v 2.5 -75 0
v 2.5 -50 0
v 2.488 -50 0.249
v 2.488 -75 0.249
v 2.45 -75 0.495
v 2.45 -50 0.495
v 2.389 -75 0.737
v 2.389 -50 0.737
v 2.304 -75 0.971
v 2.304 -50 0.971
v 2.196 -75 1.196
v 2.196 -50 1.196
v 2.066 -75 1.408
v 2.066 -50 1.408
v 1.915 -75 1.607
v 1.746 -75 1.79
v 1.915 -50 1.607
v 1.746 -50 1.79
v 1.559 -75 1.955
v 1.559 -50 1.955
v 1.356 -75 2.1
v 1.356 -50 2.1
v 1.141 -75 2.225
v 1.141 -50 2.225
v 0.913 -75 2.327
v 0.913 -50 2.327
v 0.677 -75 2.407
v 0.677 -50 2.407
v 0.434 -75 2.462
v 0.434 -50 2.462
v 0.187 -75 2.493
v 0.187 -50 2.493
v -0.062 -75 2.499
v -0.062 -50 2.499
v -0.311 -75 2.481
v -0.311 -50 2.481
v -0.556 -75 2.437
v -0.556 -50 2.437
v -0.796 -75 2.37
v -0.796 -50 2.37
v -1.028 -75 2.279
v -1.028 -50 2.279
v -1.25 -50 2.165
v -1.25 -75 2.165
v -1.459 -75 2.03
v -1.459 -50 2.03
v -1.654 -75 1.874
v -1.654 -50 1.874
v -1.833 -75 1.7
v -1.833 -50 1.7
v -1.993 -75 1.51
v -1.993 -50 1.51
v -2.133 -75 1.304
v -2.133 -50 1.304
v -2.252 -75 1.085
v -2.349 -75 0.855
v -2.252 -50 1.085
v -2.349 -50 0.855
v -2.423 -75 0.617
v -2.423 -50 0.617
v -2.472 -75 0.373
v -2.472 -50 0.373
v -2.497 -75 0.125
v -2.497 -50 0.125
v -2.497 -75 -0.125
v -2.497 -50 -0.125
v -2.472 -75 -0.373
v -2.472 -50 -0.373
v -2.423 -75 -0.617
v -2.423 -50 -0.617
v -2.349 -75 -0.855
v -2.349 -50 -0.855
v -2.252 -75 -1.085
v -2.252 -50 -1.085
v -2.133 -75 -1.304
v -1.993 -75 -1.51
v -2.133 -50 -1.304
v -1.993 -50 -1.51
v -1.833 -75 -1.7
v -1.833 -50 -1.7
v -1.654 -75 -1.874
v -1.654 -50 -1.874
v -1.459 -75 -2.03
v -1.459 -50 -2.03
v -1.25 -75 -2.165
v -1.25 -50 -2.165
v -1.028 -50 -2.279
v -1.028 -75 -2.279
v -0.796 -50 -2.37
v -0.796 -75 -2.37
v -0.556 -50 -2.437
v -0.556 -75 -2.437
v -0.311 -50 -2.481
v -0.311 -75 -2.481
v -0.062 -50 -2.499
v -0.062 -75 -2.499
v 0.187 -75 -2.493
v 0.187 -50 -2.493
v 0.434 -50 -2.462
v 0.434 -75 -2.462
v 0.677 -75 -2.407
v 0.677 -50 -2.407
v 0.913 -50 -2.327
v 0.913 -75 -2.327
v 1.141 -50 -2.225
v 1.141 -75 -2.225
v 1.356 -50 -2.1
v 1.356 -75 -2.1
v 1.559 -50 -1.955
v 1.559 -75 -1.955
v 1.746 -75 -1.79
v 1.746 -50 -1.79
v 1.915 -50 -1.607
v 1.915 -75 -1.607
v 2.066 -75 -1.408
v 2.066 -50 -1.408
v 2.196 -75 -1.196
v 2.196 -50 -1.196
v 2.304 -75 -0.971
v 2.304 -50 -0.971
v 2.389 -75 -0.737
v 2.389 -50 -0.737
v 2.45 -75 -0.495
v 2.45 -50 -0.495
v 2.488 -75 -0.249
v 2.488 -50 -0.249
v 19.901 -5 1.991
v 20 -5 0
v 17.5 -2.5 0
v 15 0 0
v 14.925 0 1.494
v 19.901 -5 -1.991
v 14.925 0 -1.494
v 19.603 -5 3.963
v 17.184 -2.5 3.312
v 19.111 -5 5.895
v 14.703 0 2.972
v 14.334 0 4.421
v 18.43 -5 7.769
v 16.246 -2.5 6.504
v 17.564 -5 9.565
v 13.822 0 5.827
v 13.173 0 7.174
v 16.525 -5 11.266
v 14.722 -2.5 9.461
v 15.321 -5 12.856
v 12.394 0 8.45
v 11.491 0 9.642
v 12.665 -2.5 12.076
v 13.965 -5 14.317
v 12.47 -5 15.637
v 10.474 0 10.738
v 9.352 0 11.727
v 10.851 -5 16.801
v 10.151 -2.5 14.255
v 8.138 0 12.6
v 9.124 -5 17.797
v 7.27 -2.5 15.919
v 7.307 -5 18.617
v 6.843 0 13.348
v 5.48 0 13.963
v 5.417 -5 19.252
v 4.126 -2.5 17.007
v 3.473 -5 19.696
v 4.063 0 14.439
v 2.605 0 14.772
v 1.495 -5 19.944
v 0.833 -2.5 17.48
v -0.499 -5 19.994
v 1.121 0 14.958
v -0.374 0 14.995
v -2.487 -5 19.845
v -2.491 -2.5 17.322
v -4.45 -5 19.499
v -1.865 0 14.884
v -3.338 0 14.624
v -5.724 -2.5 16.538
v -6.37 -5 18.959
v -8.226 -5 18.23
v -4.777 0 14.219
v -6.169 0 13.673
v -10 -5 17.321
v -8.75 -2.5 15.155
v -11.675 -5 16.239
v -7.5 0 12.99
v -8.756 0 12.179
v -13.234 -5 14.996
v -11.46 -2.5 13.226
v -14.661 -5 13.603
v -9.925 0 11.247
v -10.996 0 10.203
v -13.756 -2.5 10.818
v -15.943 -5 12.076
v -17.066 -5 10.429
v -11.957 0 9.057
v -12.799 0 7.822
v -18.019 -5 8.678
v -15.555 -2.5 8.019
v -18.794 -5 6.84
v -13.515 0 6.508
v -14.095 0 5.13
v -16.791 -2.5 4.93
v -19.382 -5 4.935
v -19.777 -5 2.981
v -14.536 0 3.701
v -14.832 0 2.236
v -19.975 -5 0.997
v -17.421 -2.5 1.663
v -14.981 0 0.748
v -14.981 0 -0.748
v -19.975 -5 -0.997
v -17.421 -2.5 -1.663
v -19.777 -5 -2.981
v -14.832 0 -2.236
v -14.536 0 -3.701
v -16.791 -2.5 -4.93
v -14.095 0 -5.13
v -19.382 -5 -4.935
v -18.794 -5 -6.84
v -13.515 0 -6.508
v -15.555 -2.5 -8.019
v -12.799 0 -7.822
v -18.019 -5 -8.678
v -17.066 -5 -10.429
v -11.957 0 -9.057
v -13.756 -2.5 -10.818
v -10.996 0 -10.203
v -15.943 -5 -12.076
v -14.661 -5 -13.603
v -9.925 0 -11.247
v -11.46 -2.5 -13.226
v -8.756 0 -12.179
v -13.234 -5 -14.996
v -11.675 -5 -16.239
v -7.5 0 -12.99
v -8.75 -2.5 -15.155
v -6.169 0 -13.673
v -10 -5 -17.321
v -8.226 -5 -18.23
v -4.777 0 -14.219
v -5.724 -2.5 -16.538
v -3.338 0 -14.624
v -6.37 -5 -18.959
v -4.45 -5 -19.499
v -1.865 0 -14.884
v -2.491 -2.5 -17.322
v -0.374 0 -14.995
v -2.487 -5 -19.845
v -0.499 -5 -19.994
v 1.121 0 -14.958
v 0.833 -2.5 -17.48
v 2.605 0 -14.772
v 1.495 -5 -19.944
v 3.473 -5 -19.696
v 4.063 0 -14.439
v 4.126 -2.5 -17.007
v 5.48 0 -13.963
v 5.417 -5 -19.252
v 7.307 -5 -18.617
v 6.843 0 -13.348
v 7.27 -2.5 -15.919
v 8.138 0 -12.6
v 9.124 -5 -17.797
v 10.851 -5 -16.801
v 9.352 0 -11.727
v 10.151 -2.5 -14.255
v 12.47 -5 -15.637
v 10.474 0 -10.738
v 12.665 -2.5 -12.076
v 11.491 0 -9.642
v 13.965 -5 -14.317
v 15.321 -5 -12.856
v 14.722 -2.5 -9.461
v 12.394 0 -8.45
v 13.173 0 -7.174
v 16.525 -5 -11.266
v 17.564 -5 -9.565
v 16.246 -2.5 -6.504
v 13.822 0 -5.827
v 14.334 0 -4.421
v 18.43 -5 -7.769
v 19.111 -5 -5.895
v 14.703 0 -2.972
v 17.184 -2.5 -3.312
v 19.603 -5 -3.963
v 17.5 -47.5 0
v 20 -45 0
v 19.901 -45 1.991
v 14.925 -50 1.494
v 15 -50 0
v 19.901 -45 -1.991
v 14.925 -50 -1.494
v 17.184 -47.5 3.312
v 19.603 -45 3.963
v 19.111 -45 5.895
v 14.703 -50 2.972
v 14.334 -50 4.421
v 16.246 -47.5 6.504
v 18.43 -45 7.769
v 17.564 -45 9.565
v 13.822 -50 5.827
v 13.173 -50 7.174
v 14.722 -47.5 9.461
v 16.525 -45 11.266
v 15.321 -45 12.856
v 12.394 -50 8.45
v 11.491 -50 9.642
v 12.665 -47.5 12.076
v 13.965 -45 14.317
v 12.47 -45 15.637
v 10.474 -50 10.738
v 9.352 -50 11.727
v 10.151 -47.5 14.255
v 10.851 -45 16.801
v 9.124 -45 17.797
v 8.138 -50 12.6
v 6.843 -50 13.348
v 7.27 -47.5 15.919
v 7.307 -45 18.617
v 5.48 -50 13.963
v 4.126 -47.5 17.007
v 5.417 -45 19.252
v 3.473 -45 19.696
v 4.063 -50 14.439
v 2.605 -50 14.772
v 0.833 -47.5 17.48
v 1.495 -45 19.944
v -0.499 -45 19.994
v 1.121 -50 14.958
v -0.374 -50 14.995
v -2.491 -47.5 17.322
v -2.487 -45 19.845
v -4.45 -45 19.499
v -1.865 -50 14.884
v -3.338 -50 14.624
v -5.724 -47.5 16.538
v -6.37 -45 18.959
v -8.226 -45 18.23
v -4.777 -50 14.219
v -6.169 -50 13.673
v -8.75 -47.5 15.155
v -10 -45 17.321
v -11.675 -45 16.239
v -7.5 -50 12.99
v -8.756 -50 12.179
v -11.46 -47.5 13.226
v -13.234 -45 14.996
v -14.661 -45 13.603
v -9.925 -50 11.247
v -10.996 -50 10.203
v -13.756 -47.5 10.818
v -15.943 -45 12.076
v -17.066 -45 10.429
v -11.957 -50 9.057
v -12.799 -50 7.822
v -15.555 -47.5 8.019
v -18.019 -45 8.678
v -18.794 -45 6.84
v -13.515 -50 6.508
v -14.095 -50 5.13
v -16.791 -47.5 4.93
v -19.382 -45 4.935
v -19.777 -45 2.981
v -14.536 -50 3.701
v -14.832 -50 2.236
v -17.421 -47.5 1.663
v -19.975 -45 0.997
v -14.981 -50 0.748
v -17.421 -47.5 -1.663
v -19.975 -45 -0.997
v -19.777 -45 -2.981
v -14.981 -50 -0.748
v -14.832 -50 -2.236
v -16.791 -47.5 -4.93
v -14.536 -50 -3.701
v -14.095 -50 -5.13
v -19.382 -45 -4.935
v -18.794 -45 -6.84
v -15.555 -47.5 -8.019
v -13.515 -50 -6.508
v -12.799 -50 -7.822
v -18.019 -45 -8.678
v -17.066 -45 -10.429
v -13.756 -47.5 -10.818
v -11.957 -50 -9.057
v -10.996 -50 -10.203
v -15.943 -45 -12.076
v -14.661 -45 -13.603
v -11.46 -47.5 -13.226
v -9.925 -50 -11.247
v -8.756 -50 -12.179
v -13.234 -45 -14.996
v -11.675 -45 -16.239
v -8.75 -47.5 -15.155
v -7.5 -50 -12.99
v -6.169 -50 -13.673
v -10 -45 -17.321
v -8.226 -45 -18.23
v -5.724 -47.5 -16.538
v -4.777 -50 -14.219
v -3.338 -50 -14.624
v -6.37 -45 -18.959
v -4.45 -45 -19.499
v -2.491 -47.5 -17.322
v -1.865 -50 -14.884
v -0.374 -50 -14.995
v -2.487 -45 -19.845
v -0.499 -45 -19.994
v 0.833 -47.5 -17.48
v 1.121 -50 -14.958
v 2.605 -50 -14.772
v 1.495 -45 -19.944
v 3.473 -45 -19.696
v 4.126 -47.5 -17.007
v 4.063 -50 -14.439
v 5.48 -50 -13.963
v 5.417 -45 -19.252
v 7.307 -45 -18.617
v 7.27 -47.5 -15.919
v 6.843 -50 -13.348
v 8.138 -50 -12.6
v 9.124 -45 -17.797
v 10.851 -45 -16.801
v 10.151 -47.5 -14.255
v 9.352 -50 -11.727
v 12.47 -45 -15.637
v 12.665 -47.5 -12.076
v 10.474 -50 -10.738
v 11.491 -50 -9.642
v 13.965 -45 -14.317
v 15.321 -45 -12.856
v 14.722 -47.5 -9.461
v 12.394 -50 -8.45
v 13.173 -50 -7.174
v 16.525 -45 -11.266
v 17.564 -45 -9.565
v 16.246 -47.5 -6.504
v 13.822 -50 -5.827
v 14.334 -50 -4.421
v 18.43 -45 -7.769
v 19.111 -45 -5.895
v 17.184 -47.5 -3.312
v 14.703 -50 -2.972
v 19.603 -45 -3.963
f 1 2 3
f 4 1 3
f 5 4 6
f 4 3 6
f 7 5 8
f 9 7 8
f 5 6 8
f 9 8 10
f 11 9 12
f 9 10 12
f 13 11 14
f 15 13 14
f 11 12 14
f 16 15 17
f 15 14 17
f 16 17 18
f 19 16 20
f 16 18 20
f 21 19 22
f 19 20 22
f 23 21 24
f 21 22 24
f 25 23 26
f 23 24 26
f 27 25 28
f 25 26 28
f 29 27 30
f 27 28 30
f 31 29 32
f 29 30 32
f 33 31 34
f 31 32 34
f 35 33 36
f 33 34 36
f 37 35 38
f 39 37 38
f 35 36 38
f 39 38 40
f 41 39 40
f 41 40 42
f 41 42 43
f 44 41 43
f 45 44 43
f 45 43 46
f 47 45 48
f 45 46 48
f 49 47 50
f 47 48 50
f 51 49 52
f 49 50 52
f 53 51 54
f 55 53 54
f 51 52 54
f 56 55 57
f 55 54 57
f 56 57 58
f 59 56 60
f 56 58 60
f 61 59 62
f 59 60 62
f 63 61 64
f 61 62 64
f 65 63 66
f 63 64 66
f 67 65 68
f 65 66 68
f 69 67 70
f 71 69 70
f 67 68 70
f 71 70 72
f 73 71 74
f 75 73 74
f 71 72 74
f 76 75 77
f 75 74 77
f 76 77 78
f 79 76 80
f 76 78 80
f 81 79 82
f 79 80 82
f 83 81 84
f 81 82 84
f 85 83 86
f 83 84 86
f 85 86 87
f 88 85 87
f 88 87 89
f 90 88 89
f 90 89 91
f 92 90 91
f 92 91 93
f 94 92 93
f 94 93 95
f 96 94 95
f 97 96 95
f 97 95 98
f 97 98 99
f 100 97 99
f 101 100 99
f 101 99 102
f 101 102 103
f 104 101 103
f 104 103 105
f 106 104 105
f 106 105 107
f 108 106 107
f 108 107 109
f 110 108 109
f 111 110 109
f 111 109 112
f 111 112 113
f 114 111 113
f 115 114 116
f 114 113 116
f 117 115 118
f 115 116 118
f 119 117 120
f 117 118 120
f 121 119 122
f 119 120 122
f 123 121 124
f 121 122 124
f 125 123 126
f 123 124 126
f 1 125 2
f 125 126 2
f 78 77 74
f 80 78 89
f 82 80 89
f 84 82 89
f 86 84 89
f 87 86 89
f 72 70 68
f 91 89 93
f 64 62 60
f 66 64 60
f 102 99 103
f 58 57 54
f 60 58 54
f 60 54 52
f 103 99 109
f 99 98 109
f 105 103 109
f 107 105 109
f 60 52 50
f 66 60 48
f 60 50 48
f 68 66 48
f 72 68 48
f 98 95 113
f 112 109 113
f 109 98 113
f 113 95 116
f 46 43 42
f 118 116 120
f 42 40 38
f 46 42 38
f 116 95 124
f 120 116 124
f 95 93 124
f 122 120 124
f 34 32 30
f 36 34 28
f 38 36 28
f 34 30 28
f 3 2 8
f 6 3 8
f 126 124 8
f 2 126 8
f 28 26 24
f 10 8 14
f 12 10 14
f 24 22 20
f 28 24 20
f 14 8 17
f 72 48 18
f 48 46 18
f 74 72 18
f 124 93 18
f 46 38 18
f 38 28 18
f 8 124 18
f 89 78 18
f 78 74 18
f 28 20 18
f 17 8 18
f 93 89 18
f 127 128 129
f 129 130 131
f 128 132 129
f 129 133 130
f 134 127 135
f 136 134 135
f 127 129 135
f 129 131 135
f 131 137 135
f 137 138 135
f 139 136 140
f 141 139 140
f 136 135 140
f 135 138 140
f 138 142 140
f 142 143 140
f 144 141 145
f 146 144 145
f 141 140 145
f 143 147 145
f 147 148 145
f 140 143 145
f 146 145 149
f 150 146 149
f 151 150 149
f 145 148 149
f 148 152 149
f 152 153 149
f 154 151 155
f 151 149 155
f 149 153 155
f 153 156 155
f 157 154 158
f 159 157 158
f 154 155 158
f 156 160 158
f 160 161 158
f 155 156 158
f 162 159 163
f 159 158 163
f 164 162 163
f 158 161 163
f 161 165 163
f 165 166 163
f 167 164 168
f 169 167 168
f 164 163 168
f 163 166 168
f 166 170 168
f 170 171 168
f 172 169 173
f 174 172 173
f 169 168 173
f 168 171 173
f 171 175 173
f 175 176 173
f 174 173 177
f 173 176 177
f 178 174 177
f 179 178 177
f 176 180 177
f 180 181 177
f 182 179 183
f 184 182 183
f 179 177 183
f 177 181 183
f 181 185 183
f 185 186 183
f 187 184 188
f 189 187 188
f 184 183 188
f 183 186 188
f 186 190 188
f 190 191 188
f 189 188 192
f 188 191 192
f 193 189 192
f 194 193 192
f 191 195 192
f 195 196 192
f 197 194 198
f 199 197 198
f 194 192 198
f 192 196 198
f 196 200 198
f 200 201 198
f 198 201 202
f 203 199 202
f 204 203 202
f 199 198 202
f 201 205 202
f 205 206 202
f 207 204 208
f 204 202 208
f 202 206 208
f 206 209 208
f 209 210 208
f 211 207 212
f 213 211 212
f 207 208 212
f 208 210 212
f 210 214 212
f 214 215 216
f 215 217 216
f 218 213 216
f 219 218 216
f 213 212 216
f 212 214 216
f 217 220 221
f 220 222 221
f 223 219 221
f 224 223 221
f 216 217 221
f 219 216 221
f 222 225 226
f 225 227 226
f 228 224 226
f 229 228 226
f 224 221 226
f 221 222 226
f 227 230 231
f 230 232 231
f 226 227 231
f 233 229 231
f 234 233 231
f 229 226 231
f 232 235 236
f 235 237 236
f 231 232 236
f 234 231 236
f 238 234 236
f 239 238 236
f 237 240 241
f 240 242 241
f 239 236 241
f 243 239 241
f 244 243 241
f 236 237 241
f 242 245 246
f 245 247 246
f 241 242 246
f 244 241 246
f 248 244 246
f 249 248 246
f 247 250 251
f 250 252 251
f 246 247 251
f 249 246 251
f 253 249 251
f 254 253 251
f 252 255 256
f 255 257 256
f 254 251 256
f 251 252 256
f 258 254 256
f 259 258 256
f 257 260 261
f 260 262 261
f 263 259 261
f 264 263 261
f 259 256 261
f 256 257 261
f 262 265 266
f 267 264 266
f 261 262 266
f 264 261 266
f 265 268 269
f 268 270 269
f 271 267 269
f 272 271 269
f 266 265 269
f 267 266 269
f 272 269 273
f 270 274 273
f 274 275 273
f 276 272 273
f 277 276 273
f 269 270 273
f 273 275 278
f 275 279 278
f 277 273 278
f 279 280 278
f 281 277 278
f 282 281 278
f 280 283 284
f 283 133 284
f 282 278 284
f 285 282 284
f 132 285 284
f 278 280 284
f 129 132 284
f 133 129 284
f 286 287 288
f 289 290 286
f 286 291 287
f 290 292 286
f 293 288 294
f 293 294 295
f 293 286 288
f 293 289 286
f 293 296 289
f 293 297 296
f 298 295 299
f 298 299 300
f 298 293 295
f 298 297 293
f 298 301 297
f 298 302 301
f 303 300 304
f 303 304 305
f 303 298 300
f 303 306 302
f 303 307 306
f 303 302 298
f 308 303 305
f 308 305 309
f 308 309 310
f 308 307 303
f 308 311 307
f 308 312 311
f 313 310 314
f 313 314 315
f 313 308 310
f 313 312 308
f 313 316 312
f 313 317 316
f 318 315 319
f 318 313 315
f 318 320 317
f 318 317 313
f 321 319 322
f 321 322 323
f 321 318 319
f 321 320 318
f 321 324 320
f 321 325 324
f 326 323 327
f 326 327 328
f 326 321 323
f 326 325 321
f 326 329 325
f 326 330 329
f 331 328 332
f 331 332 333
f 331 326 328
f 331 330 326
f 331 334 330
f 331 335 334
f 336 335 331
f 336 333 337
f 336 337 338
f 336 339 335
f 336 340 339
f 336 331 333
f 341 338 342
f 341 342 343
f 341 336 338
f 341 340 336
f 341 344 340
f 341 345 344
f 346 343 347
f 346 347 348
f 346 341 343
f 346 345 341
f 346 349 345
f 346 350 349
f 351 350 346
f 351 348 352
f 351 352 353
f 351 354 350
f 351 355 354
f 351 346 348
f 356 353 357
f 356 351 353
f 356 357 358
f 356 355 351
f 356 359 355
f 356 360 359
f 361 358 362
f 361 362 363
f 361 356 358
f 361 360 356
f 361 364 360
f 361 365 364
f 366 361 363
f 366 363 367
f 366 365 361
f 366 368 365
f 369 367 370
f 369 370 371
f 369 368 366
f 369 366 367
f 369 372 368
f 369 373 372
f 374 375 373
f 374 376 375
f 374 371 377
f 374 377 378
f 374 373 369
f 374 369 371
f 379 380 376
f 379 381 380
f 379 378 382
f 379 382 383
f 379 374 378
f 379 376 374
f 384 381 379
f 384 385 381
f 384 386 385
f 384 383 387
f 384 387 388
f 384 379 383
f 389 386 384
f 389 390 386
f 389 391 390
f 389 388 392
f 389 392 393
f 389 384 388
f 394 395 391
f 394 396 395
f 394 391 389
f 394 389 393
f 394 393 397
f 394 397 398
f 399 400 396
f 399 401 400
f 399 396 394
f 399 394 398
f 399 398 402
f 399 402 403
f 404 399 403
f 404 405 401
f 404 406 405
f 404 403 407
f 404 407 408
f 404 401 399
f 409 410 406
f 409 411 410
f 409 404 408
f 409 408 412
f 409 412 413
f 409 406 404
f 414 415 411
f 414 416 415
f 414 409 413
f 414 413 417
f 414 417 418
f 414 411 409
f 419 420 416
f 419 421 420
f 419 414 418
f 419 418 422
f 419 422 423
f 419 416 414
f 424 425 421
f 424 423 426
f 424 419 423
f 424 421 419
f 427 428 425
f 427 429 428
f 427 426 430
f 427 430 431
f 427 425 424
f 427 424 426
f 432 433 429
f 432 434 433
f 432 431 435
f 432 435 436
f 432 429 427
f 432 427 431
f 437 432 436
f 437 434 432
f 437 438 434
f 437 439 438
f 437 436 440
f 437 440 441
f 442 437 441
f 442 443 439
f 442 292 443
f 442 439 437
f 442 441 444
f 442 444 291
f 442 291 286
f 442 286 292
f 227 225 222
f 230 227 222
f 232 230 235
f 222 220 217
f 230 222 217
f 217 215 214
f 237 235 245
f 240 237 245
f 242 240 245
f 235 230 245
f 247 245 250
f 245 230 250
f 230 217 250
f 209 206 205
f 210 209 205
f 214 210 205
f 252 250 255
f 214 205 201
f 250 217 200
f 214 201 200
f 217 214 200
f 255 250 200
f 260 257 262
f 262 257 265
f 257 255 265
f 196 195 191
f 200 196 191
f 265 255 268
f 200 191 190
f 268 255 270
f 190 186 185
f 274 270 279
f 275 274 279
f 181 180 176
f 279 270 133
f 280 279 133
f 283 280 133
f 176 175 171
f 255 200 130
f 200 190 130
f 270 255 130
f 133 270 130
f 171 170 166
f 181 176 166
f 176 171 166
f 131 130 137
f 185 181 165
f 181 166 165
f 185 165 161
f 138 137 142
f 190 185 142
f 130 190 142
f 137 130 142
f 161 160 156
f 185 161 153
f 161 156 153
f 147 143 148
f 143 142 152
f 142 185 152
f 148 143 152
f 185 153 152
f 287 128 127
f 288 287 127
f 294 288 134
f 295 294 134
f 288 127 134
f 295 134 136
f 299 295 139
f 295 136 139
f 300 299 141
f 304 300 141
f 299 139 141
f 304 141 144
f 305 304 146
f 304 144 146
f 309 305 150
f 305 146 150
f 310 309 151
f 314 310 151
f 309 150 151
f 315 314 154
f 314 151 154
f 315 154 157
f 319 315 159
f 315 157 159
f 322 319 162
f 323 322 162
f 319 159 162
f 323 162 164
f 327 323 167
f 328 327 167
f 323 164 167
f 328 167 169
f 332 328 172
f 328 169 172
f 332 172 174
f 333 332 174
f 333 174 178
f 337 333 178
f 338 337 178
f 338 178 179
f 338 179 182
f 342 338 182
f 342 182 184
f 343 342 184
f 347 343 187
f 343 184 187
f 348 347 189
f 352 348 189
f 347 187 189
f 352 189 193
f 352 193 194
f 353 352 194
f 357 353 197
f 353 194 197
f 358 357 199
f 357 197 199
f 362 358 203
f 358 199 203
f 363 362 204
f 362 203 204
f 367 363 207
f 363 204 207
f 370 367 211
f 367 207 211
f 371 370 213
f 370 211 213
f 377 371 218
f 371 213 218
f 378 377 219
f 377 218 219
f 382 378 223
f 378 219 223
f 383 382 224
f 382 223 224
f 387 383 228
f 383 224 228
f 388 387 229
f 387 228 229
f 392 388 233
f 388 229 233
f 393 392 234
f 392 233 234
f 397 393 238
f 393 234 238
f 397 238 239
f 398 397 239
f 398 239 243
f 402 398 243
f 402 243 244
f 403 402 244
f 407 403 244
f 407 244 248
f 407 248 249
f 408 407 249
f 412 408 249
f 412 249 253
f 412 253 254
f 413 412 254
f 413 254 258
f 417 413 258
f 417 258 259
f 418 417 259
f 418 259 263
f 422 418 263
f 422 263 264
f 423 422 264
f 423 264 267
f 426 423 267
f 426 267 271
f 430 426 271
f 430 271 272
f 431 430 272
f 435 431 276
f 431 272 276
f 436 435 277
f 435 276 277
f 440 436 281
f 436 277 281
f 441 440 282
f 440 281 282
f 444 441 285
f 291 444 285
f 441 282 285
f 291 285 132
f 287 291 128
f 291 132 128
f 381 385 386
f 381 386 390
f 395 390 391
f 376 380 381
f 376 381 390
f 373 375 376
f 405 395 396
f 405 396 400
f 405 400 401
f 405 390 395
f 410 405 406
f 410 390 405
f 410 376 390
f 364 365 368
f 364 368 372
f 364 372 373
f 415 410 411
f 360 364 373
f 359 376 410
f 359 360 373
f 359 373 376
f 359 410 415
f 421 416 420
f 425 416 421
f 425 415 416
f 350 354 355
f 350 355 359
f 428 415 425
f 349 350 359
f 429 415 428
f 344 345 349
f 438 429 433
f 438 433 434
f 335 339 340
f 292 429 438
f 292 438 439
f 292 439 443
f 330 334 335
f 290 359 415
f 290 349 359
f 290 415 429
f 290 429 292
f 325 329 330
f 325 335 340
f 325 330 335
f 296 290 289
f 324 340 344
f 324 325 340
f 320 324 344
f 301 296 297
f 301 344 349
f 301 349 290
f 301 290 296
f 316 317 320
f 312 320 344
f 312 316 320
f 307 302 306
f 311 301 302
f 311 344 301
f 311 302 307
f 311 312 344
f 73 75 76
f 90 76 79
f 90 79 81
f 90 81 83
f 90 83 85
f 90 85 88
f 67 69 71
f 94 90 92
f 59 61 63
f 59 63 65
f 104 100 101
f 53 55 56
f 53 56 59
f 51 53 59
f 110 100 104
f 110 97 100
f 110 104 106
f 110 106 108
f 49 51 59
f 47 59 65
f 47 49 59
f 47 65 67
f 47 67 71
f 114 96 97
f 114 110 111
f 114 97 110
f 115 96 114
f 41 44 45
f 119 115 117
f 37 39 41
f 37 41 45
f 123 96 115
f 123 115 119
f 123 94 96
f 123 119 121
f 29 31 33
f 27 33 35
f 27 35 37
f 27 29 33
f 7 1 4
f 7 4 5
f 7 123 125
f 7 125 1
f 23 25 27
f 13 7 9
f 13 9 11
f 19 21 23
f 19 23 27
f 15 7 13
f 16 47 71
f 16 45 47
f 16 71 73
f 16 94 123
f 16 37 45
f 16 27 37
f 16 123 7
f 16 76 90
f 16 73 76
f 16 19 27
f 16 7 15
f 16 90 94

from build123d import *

# Parameters (mm, degrees)
F0_R     = 20
F1_DEPTH = 50
F2_SIZE  = 5
F4_SIZE  = 5
F3_R     = 2.5
F5_DEPTH = 25


with BuildPart() as f1:
    # F0 (on Front) → F1 (new body)
    with BuildSketch(Plane.XZ):
        Circle(F0_R)
    extrude(amount=F1_DEPTH)

    # F2
    f2_edges = [f1.edges().sort_by_distance(p)[0] for p in [
        (-20, -50, 0),
    ]]
    chamfer(f2_edges, length=F2_SIZE)

    # F4
    f4_edges = [f1.edges().sort_by_distance(p)[0] for p in [
        (-20, 0, 0),
    ]]
    chamfer(f4_edges, length=F4_SIZE)


with BuildPart() as f5:
    # F3 (on face) → F5 (new body)
    with BuildSketch(Plane.XZ.offset(50)):
        Circle(F3_R)
    extrude(amount=F5_DEPTH)


solid = Compound([f1.part, f5.part])
